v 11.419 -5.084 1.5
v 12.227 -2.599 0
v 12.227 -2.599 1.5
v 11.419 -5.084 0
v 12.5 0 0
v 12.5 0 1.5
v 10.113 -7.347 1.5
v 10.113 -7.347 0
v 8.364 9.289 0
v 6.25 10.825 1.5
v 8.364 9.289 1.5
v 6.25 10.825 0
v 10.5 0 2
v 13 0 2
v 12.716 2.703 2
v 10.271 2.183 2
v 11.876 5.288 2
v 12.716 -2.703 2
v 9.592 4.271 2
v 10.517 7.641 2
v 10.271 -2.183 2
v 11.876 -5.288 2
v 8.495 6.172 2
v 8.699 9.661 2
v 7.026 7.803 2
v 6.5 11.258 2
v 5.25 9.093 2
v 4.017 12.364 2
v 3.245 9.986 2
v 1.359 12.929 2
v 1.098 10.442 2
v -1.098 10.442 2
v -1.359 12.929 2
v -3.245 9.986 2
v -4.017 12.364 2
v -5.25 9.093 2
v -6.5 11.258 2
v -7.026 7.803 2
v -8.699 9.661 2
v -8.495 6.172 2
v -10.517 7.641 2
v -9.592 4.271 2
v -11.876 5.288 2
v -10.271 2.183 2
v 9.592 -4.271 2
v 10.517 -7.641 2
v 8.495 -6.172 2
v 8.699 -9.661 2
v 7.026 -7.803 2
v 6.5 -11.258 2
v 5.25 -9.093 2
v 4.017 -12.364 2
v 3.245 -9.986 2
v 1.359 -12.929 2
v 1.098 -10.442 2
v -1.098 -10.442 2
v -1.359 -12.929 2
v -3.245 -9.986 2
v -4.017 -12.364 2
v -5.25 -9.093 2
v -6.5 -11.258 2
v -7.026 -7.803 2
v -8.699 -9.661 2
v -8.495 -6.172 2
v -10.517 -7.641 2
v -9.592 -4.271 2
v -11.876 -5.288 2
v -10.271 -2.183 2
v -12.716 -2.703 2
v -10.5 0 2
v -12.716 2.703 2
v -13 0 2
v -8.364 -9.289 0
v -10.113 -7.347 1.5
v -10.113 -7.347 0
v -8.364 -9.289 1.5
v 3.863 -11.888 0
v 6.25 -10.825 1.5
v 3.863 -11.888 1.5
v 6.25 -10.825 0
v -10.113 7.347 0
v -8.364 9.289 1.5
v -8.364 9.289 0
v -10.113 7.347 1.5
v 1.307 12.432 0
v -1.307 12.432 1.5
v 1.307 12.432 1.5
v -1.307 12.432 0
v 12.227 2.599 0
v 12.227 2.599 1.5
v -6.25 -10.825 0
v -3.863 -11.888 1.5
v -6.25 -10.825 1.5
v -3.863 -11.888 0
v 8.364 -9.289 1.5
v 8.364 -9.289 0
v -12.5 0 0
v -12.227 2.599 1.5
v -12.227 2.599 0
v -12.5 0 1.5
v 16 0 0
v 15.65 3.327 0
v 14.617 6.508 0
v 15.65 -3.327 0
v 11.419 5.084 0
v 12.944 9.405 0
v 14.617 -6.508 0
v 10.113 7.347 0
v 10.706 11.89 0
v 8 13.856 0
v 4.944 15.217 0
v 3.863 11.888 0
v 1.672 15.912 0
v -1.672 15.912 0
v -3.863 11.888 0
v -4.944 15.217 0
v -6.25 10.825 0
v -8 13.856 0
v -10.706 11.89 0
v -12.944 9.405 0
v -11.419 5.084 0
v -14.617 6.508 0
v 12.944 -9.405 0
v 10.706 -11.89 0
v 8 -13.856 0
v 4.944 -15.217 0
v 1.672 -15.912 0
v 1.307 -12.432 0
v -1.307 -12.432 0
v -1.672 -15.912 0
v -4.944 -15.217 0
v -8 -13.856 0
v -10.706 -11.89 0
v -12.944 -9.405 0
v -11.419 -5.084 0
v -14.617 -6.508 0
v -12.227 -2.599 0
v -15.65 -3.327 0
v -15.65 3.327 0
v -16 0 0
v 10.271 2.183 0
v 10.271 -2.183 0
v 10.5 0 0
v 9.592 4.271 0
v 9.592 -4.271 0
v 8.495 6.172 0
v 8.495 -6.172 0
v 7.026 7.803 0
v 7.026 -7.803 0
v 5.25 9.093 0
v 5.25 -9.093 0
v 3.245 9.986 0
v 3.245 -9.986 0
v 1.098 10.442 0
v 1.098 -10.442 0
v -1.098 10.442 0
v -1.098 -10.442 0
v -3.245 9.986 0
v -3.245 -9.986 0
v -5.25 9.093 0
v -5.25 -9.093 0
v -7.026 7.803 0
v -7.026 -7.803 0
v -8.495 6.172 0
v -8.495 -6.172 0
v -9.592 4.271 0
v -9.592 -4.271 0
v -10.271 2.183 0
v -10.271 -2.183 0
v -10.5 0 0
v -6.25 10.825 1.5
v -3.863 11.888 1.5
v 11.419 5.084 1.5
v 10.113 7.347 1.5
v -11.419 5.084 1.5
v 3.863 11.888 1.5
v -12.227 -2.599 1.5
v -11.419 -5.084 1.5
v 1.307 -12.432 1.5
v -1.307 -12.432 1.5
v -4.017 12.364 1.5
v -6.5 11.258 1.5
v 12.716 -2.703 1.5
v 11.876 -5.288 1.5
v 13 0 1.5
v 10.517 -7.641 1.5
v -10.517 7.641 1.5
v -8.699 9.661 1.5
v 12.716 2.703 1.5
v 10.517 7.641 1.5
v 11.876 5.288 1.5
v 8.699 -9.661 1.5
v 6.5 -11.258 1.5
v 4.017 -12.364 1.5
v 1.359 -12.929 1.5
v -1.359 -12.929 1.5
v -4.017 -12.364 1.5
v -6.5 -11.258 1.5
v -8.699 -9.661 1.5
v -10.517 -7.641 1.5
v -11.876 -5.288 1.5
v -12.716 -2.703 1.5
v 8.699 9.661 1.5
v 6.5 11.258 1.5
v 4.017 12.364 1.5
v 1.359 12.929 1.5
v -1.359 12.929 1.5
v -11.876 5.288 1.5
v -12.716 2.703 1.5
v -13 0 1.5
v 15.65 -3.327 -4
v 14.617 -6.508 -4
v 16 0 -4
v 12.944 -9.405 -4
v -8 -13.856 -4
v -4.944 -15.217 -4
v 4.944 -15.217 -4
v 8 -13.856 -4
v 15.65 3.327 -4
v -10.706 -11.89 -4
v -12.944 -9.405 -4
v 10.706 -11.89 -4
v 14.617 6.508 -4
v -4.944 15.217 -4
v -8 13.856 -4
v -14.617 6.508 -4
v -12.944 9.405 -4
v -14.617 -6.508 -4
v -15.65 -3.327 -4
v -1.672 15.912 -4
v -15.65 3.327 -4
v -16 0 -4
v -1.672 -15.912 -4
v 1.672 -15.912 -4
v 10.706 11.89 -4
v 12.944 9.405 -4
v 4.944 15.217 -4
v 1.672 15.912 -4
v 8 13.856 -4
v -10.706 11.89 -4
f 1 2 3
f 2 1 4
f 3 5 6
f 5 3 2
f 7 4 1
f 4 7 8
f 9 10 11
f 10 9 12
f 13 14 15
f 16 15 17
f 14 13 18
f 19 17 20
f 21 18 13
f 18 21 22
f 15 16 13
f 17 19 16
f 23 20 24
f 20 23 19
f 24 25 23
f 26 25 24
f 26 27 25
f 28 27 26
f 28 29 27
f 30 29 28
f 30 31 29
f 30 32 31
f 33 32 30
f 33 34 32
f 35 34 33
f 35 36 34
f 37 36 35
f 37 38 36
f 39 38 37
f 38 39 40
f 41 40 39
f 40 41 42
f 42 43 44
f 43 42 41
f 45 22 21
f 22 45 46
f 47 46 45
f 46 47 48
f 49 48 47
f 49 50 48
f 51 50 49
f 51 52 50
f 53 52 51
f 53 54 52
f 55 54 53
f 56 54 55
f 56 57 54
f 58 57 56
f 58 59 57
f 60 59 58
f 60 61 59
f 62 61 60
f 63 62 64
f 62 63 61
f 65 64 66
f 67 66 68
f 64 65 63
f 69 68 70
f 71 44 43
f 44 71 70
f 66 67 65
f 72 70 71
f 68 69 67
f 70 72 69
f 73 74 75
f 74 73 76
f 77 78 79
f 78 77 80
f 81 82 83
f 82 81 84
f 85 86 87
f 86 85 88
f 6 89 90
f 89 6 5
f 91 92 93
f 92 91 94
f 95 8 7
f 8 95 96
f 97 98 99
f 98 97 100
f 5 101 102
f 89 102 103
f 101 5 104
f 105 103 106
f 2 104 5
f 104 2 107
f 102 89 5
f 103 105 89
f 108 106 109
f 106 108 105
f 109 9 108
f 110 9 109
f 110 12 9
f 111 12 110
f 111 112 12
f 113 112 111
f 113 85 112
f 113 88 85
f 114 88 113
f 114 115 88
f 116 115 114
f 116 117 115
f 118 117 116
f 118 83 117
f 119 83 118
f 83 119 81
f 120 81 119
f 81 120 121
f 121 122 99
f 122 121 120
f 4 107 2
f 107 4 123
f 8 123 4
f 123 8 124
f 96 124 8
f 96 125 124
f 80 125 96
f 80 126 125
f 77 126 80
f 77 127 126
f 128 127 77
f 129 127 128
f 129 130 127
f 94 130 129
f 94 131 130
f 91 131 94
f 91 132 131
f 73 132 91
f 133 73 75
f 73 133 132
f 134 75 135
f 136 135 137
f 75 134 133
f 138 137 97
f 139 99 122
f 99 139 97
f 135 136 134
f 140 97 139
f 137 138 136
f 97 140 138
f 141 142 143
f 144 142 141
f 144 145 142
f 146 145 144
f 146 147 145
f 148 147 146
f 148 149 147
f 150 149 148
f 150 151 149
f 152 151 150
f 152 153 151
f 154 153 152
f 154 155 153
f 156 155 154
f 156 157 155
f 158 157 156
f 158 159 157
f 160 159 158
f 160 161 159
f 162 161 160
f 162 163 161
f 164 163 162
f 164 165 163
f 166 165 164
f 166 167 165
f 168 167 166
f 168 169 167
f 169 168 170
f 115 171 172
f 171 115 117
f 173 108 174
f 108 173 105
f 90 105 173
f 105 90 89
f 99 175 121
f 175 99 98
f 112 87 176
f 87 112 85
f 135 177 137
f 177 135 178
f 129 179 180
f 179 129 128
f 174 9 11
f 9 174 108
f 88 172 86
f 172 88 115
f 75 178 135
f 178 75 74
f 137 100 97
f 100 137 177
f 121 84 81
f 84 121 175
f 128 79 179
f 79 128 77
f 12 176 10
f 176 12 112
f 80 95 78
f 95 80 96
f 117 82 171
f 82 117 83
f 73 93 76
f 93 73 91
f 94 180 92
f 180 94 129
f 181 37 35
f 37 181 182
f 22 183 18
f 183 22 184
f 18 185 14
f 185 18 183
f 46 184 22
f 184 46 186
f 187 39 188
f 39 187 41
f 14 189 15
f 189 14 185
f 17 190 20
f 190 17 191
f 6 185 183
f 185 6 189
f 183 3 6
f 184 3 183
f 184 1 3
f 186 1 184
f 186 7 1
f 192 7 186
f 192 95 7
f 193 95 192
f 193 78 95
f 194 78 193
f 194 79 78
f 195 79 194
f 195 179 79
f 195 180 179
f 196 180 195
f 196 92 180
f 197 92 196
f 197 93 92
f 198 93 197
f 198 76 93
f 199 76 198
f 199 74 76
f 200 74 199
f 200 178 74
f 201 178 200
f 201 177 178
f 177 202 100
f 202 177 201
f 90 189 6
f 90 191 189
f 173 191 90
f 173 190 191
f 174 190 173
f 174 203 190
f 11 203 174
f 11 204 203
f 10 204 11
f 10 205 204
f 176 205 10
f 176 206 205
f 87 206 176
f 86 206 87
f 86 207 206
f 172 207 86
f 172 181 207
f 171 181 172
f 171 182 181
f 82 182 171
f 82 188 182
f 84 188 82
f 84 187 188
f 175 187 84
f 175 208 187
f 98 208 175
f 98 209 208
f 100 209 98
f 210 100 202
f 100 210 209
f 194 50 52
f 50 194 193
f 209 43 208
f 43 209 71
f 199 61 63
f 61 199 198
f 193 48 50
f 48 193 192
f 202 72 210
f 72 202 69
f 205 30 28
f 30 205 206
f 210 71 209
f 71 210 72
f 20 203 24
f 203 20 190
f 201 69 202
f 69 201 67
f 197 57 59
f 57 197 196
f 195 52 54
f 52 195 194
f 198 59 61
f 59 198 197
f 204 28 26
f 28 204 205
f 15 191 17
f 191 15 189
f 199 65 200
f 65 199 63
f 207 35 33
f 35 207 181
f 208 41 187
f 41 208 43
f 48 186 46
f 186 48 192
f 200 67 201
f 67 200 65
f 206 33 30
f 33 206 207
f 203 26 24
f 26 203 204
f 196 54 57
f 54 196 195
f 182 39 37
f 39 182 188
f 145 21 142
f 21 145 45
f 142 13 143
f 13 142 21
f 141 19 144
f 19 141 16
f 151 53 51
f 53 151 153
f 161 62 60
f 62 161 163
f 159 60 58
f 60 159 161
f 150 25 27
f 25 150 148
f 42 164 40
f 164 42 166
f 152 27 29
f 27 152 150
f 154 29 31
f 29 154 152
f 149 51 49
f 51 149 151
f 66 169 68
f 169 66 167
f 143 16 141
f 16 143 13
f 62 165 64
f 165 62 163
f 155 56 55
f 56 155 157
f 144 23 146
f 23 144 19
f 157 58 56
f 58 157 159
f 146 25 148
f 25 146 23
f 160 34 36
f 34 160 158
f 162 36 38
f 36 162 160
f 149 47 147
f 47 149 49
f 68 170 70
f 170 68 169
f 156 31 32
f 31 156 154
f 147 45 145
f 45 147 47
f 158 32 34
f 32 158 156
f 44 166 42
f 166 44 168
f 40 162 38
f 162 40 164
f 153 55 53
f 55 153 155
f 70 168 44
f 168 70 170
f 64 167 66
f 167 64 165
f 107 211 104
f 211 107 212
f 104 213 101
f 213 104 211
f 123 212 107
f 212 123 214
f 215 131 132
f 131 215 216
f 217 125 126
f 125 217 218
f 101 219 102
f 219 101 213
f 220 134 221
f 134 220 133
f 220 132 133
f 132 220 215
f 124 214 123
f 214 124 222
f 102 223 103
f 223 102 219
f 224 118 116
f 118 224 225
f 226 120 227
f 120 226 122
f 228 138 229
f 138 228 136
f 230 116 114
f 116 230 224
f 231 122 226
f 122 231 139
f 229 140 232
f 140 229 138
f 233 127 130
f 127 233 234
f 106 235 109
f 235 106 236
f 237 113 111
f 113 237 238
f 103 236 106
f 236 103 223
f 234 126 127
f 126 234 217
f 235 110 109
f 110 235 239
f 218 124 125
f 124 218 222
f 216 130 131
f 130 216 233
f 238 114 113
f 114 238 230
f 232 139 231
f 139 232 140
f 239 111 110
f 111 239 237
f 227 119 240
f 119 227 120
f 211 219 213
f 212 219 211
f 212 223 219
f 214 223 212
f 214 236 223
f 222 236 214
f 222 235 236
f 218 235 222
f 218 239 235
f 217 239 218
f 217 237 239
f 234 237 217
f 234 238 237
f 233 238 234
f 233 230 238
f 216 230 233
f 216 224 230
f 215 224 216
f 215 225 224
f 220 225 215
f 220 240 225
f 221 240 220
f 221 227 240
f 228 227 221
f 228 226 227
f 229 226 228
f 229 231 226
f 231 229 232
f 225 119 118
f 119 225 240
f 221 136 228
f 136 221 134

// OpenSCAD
$fs = .1;
radius = 32/2;
height = 4;

module mainBody()
{
    //Main structural body
    cylinder
    (
        height,
        radius,
        radius,
        center = false,
        $fs = $fs
    );
}

module connector()
{
    //What actually holds the part onto the handlebars
    connHeight = 2;
    connRadius = 25/2;
    translate
    (
        [
            0,
            0,
            -connHeight
        ]
    )
    {
        difference()
        {
            union()
            {
                //Basic body
                cylinder
                (
                    connHeight,
                    connRadius,
                    connRadius,
                    center = false,
                    $fs = $fs
                );

                //Friction grabber
                cylinder
                (
                    0.5,
                    connRadius+.5,
                    connRadius+.5,
                    center = false,
                    $fs = $fs
                );
            }

            //Inner cavity
            buffer = 1;
            translate
            (
                [
                    0,
                    0,
                    -buffer
                ]
            )
            {
                innerRadius = 21/2;
                cylinder
                (
                    connHeight+buffer,
                    innerRadius,
                    innerRadius,
                    center = false,
                    $fs = $fs
                );
            }
        }
    }
}

module main()
{
    rotate(a=[180,0,0])
    {
        mainBody();
        connector();
    }
}

main();
